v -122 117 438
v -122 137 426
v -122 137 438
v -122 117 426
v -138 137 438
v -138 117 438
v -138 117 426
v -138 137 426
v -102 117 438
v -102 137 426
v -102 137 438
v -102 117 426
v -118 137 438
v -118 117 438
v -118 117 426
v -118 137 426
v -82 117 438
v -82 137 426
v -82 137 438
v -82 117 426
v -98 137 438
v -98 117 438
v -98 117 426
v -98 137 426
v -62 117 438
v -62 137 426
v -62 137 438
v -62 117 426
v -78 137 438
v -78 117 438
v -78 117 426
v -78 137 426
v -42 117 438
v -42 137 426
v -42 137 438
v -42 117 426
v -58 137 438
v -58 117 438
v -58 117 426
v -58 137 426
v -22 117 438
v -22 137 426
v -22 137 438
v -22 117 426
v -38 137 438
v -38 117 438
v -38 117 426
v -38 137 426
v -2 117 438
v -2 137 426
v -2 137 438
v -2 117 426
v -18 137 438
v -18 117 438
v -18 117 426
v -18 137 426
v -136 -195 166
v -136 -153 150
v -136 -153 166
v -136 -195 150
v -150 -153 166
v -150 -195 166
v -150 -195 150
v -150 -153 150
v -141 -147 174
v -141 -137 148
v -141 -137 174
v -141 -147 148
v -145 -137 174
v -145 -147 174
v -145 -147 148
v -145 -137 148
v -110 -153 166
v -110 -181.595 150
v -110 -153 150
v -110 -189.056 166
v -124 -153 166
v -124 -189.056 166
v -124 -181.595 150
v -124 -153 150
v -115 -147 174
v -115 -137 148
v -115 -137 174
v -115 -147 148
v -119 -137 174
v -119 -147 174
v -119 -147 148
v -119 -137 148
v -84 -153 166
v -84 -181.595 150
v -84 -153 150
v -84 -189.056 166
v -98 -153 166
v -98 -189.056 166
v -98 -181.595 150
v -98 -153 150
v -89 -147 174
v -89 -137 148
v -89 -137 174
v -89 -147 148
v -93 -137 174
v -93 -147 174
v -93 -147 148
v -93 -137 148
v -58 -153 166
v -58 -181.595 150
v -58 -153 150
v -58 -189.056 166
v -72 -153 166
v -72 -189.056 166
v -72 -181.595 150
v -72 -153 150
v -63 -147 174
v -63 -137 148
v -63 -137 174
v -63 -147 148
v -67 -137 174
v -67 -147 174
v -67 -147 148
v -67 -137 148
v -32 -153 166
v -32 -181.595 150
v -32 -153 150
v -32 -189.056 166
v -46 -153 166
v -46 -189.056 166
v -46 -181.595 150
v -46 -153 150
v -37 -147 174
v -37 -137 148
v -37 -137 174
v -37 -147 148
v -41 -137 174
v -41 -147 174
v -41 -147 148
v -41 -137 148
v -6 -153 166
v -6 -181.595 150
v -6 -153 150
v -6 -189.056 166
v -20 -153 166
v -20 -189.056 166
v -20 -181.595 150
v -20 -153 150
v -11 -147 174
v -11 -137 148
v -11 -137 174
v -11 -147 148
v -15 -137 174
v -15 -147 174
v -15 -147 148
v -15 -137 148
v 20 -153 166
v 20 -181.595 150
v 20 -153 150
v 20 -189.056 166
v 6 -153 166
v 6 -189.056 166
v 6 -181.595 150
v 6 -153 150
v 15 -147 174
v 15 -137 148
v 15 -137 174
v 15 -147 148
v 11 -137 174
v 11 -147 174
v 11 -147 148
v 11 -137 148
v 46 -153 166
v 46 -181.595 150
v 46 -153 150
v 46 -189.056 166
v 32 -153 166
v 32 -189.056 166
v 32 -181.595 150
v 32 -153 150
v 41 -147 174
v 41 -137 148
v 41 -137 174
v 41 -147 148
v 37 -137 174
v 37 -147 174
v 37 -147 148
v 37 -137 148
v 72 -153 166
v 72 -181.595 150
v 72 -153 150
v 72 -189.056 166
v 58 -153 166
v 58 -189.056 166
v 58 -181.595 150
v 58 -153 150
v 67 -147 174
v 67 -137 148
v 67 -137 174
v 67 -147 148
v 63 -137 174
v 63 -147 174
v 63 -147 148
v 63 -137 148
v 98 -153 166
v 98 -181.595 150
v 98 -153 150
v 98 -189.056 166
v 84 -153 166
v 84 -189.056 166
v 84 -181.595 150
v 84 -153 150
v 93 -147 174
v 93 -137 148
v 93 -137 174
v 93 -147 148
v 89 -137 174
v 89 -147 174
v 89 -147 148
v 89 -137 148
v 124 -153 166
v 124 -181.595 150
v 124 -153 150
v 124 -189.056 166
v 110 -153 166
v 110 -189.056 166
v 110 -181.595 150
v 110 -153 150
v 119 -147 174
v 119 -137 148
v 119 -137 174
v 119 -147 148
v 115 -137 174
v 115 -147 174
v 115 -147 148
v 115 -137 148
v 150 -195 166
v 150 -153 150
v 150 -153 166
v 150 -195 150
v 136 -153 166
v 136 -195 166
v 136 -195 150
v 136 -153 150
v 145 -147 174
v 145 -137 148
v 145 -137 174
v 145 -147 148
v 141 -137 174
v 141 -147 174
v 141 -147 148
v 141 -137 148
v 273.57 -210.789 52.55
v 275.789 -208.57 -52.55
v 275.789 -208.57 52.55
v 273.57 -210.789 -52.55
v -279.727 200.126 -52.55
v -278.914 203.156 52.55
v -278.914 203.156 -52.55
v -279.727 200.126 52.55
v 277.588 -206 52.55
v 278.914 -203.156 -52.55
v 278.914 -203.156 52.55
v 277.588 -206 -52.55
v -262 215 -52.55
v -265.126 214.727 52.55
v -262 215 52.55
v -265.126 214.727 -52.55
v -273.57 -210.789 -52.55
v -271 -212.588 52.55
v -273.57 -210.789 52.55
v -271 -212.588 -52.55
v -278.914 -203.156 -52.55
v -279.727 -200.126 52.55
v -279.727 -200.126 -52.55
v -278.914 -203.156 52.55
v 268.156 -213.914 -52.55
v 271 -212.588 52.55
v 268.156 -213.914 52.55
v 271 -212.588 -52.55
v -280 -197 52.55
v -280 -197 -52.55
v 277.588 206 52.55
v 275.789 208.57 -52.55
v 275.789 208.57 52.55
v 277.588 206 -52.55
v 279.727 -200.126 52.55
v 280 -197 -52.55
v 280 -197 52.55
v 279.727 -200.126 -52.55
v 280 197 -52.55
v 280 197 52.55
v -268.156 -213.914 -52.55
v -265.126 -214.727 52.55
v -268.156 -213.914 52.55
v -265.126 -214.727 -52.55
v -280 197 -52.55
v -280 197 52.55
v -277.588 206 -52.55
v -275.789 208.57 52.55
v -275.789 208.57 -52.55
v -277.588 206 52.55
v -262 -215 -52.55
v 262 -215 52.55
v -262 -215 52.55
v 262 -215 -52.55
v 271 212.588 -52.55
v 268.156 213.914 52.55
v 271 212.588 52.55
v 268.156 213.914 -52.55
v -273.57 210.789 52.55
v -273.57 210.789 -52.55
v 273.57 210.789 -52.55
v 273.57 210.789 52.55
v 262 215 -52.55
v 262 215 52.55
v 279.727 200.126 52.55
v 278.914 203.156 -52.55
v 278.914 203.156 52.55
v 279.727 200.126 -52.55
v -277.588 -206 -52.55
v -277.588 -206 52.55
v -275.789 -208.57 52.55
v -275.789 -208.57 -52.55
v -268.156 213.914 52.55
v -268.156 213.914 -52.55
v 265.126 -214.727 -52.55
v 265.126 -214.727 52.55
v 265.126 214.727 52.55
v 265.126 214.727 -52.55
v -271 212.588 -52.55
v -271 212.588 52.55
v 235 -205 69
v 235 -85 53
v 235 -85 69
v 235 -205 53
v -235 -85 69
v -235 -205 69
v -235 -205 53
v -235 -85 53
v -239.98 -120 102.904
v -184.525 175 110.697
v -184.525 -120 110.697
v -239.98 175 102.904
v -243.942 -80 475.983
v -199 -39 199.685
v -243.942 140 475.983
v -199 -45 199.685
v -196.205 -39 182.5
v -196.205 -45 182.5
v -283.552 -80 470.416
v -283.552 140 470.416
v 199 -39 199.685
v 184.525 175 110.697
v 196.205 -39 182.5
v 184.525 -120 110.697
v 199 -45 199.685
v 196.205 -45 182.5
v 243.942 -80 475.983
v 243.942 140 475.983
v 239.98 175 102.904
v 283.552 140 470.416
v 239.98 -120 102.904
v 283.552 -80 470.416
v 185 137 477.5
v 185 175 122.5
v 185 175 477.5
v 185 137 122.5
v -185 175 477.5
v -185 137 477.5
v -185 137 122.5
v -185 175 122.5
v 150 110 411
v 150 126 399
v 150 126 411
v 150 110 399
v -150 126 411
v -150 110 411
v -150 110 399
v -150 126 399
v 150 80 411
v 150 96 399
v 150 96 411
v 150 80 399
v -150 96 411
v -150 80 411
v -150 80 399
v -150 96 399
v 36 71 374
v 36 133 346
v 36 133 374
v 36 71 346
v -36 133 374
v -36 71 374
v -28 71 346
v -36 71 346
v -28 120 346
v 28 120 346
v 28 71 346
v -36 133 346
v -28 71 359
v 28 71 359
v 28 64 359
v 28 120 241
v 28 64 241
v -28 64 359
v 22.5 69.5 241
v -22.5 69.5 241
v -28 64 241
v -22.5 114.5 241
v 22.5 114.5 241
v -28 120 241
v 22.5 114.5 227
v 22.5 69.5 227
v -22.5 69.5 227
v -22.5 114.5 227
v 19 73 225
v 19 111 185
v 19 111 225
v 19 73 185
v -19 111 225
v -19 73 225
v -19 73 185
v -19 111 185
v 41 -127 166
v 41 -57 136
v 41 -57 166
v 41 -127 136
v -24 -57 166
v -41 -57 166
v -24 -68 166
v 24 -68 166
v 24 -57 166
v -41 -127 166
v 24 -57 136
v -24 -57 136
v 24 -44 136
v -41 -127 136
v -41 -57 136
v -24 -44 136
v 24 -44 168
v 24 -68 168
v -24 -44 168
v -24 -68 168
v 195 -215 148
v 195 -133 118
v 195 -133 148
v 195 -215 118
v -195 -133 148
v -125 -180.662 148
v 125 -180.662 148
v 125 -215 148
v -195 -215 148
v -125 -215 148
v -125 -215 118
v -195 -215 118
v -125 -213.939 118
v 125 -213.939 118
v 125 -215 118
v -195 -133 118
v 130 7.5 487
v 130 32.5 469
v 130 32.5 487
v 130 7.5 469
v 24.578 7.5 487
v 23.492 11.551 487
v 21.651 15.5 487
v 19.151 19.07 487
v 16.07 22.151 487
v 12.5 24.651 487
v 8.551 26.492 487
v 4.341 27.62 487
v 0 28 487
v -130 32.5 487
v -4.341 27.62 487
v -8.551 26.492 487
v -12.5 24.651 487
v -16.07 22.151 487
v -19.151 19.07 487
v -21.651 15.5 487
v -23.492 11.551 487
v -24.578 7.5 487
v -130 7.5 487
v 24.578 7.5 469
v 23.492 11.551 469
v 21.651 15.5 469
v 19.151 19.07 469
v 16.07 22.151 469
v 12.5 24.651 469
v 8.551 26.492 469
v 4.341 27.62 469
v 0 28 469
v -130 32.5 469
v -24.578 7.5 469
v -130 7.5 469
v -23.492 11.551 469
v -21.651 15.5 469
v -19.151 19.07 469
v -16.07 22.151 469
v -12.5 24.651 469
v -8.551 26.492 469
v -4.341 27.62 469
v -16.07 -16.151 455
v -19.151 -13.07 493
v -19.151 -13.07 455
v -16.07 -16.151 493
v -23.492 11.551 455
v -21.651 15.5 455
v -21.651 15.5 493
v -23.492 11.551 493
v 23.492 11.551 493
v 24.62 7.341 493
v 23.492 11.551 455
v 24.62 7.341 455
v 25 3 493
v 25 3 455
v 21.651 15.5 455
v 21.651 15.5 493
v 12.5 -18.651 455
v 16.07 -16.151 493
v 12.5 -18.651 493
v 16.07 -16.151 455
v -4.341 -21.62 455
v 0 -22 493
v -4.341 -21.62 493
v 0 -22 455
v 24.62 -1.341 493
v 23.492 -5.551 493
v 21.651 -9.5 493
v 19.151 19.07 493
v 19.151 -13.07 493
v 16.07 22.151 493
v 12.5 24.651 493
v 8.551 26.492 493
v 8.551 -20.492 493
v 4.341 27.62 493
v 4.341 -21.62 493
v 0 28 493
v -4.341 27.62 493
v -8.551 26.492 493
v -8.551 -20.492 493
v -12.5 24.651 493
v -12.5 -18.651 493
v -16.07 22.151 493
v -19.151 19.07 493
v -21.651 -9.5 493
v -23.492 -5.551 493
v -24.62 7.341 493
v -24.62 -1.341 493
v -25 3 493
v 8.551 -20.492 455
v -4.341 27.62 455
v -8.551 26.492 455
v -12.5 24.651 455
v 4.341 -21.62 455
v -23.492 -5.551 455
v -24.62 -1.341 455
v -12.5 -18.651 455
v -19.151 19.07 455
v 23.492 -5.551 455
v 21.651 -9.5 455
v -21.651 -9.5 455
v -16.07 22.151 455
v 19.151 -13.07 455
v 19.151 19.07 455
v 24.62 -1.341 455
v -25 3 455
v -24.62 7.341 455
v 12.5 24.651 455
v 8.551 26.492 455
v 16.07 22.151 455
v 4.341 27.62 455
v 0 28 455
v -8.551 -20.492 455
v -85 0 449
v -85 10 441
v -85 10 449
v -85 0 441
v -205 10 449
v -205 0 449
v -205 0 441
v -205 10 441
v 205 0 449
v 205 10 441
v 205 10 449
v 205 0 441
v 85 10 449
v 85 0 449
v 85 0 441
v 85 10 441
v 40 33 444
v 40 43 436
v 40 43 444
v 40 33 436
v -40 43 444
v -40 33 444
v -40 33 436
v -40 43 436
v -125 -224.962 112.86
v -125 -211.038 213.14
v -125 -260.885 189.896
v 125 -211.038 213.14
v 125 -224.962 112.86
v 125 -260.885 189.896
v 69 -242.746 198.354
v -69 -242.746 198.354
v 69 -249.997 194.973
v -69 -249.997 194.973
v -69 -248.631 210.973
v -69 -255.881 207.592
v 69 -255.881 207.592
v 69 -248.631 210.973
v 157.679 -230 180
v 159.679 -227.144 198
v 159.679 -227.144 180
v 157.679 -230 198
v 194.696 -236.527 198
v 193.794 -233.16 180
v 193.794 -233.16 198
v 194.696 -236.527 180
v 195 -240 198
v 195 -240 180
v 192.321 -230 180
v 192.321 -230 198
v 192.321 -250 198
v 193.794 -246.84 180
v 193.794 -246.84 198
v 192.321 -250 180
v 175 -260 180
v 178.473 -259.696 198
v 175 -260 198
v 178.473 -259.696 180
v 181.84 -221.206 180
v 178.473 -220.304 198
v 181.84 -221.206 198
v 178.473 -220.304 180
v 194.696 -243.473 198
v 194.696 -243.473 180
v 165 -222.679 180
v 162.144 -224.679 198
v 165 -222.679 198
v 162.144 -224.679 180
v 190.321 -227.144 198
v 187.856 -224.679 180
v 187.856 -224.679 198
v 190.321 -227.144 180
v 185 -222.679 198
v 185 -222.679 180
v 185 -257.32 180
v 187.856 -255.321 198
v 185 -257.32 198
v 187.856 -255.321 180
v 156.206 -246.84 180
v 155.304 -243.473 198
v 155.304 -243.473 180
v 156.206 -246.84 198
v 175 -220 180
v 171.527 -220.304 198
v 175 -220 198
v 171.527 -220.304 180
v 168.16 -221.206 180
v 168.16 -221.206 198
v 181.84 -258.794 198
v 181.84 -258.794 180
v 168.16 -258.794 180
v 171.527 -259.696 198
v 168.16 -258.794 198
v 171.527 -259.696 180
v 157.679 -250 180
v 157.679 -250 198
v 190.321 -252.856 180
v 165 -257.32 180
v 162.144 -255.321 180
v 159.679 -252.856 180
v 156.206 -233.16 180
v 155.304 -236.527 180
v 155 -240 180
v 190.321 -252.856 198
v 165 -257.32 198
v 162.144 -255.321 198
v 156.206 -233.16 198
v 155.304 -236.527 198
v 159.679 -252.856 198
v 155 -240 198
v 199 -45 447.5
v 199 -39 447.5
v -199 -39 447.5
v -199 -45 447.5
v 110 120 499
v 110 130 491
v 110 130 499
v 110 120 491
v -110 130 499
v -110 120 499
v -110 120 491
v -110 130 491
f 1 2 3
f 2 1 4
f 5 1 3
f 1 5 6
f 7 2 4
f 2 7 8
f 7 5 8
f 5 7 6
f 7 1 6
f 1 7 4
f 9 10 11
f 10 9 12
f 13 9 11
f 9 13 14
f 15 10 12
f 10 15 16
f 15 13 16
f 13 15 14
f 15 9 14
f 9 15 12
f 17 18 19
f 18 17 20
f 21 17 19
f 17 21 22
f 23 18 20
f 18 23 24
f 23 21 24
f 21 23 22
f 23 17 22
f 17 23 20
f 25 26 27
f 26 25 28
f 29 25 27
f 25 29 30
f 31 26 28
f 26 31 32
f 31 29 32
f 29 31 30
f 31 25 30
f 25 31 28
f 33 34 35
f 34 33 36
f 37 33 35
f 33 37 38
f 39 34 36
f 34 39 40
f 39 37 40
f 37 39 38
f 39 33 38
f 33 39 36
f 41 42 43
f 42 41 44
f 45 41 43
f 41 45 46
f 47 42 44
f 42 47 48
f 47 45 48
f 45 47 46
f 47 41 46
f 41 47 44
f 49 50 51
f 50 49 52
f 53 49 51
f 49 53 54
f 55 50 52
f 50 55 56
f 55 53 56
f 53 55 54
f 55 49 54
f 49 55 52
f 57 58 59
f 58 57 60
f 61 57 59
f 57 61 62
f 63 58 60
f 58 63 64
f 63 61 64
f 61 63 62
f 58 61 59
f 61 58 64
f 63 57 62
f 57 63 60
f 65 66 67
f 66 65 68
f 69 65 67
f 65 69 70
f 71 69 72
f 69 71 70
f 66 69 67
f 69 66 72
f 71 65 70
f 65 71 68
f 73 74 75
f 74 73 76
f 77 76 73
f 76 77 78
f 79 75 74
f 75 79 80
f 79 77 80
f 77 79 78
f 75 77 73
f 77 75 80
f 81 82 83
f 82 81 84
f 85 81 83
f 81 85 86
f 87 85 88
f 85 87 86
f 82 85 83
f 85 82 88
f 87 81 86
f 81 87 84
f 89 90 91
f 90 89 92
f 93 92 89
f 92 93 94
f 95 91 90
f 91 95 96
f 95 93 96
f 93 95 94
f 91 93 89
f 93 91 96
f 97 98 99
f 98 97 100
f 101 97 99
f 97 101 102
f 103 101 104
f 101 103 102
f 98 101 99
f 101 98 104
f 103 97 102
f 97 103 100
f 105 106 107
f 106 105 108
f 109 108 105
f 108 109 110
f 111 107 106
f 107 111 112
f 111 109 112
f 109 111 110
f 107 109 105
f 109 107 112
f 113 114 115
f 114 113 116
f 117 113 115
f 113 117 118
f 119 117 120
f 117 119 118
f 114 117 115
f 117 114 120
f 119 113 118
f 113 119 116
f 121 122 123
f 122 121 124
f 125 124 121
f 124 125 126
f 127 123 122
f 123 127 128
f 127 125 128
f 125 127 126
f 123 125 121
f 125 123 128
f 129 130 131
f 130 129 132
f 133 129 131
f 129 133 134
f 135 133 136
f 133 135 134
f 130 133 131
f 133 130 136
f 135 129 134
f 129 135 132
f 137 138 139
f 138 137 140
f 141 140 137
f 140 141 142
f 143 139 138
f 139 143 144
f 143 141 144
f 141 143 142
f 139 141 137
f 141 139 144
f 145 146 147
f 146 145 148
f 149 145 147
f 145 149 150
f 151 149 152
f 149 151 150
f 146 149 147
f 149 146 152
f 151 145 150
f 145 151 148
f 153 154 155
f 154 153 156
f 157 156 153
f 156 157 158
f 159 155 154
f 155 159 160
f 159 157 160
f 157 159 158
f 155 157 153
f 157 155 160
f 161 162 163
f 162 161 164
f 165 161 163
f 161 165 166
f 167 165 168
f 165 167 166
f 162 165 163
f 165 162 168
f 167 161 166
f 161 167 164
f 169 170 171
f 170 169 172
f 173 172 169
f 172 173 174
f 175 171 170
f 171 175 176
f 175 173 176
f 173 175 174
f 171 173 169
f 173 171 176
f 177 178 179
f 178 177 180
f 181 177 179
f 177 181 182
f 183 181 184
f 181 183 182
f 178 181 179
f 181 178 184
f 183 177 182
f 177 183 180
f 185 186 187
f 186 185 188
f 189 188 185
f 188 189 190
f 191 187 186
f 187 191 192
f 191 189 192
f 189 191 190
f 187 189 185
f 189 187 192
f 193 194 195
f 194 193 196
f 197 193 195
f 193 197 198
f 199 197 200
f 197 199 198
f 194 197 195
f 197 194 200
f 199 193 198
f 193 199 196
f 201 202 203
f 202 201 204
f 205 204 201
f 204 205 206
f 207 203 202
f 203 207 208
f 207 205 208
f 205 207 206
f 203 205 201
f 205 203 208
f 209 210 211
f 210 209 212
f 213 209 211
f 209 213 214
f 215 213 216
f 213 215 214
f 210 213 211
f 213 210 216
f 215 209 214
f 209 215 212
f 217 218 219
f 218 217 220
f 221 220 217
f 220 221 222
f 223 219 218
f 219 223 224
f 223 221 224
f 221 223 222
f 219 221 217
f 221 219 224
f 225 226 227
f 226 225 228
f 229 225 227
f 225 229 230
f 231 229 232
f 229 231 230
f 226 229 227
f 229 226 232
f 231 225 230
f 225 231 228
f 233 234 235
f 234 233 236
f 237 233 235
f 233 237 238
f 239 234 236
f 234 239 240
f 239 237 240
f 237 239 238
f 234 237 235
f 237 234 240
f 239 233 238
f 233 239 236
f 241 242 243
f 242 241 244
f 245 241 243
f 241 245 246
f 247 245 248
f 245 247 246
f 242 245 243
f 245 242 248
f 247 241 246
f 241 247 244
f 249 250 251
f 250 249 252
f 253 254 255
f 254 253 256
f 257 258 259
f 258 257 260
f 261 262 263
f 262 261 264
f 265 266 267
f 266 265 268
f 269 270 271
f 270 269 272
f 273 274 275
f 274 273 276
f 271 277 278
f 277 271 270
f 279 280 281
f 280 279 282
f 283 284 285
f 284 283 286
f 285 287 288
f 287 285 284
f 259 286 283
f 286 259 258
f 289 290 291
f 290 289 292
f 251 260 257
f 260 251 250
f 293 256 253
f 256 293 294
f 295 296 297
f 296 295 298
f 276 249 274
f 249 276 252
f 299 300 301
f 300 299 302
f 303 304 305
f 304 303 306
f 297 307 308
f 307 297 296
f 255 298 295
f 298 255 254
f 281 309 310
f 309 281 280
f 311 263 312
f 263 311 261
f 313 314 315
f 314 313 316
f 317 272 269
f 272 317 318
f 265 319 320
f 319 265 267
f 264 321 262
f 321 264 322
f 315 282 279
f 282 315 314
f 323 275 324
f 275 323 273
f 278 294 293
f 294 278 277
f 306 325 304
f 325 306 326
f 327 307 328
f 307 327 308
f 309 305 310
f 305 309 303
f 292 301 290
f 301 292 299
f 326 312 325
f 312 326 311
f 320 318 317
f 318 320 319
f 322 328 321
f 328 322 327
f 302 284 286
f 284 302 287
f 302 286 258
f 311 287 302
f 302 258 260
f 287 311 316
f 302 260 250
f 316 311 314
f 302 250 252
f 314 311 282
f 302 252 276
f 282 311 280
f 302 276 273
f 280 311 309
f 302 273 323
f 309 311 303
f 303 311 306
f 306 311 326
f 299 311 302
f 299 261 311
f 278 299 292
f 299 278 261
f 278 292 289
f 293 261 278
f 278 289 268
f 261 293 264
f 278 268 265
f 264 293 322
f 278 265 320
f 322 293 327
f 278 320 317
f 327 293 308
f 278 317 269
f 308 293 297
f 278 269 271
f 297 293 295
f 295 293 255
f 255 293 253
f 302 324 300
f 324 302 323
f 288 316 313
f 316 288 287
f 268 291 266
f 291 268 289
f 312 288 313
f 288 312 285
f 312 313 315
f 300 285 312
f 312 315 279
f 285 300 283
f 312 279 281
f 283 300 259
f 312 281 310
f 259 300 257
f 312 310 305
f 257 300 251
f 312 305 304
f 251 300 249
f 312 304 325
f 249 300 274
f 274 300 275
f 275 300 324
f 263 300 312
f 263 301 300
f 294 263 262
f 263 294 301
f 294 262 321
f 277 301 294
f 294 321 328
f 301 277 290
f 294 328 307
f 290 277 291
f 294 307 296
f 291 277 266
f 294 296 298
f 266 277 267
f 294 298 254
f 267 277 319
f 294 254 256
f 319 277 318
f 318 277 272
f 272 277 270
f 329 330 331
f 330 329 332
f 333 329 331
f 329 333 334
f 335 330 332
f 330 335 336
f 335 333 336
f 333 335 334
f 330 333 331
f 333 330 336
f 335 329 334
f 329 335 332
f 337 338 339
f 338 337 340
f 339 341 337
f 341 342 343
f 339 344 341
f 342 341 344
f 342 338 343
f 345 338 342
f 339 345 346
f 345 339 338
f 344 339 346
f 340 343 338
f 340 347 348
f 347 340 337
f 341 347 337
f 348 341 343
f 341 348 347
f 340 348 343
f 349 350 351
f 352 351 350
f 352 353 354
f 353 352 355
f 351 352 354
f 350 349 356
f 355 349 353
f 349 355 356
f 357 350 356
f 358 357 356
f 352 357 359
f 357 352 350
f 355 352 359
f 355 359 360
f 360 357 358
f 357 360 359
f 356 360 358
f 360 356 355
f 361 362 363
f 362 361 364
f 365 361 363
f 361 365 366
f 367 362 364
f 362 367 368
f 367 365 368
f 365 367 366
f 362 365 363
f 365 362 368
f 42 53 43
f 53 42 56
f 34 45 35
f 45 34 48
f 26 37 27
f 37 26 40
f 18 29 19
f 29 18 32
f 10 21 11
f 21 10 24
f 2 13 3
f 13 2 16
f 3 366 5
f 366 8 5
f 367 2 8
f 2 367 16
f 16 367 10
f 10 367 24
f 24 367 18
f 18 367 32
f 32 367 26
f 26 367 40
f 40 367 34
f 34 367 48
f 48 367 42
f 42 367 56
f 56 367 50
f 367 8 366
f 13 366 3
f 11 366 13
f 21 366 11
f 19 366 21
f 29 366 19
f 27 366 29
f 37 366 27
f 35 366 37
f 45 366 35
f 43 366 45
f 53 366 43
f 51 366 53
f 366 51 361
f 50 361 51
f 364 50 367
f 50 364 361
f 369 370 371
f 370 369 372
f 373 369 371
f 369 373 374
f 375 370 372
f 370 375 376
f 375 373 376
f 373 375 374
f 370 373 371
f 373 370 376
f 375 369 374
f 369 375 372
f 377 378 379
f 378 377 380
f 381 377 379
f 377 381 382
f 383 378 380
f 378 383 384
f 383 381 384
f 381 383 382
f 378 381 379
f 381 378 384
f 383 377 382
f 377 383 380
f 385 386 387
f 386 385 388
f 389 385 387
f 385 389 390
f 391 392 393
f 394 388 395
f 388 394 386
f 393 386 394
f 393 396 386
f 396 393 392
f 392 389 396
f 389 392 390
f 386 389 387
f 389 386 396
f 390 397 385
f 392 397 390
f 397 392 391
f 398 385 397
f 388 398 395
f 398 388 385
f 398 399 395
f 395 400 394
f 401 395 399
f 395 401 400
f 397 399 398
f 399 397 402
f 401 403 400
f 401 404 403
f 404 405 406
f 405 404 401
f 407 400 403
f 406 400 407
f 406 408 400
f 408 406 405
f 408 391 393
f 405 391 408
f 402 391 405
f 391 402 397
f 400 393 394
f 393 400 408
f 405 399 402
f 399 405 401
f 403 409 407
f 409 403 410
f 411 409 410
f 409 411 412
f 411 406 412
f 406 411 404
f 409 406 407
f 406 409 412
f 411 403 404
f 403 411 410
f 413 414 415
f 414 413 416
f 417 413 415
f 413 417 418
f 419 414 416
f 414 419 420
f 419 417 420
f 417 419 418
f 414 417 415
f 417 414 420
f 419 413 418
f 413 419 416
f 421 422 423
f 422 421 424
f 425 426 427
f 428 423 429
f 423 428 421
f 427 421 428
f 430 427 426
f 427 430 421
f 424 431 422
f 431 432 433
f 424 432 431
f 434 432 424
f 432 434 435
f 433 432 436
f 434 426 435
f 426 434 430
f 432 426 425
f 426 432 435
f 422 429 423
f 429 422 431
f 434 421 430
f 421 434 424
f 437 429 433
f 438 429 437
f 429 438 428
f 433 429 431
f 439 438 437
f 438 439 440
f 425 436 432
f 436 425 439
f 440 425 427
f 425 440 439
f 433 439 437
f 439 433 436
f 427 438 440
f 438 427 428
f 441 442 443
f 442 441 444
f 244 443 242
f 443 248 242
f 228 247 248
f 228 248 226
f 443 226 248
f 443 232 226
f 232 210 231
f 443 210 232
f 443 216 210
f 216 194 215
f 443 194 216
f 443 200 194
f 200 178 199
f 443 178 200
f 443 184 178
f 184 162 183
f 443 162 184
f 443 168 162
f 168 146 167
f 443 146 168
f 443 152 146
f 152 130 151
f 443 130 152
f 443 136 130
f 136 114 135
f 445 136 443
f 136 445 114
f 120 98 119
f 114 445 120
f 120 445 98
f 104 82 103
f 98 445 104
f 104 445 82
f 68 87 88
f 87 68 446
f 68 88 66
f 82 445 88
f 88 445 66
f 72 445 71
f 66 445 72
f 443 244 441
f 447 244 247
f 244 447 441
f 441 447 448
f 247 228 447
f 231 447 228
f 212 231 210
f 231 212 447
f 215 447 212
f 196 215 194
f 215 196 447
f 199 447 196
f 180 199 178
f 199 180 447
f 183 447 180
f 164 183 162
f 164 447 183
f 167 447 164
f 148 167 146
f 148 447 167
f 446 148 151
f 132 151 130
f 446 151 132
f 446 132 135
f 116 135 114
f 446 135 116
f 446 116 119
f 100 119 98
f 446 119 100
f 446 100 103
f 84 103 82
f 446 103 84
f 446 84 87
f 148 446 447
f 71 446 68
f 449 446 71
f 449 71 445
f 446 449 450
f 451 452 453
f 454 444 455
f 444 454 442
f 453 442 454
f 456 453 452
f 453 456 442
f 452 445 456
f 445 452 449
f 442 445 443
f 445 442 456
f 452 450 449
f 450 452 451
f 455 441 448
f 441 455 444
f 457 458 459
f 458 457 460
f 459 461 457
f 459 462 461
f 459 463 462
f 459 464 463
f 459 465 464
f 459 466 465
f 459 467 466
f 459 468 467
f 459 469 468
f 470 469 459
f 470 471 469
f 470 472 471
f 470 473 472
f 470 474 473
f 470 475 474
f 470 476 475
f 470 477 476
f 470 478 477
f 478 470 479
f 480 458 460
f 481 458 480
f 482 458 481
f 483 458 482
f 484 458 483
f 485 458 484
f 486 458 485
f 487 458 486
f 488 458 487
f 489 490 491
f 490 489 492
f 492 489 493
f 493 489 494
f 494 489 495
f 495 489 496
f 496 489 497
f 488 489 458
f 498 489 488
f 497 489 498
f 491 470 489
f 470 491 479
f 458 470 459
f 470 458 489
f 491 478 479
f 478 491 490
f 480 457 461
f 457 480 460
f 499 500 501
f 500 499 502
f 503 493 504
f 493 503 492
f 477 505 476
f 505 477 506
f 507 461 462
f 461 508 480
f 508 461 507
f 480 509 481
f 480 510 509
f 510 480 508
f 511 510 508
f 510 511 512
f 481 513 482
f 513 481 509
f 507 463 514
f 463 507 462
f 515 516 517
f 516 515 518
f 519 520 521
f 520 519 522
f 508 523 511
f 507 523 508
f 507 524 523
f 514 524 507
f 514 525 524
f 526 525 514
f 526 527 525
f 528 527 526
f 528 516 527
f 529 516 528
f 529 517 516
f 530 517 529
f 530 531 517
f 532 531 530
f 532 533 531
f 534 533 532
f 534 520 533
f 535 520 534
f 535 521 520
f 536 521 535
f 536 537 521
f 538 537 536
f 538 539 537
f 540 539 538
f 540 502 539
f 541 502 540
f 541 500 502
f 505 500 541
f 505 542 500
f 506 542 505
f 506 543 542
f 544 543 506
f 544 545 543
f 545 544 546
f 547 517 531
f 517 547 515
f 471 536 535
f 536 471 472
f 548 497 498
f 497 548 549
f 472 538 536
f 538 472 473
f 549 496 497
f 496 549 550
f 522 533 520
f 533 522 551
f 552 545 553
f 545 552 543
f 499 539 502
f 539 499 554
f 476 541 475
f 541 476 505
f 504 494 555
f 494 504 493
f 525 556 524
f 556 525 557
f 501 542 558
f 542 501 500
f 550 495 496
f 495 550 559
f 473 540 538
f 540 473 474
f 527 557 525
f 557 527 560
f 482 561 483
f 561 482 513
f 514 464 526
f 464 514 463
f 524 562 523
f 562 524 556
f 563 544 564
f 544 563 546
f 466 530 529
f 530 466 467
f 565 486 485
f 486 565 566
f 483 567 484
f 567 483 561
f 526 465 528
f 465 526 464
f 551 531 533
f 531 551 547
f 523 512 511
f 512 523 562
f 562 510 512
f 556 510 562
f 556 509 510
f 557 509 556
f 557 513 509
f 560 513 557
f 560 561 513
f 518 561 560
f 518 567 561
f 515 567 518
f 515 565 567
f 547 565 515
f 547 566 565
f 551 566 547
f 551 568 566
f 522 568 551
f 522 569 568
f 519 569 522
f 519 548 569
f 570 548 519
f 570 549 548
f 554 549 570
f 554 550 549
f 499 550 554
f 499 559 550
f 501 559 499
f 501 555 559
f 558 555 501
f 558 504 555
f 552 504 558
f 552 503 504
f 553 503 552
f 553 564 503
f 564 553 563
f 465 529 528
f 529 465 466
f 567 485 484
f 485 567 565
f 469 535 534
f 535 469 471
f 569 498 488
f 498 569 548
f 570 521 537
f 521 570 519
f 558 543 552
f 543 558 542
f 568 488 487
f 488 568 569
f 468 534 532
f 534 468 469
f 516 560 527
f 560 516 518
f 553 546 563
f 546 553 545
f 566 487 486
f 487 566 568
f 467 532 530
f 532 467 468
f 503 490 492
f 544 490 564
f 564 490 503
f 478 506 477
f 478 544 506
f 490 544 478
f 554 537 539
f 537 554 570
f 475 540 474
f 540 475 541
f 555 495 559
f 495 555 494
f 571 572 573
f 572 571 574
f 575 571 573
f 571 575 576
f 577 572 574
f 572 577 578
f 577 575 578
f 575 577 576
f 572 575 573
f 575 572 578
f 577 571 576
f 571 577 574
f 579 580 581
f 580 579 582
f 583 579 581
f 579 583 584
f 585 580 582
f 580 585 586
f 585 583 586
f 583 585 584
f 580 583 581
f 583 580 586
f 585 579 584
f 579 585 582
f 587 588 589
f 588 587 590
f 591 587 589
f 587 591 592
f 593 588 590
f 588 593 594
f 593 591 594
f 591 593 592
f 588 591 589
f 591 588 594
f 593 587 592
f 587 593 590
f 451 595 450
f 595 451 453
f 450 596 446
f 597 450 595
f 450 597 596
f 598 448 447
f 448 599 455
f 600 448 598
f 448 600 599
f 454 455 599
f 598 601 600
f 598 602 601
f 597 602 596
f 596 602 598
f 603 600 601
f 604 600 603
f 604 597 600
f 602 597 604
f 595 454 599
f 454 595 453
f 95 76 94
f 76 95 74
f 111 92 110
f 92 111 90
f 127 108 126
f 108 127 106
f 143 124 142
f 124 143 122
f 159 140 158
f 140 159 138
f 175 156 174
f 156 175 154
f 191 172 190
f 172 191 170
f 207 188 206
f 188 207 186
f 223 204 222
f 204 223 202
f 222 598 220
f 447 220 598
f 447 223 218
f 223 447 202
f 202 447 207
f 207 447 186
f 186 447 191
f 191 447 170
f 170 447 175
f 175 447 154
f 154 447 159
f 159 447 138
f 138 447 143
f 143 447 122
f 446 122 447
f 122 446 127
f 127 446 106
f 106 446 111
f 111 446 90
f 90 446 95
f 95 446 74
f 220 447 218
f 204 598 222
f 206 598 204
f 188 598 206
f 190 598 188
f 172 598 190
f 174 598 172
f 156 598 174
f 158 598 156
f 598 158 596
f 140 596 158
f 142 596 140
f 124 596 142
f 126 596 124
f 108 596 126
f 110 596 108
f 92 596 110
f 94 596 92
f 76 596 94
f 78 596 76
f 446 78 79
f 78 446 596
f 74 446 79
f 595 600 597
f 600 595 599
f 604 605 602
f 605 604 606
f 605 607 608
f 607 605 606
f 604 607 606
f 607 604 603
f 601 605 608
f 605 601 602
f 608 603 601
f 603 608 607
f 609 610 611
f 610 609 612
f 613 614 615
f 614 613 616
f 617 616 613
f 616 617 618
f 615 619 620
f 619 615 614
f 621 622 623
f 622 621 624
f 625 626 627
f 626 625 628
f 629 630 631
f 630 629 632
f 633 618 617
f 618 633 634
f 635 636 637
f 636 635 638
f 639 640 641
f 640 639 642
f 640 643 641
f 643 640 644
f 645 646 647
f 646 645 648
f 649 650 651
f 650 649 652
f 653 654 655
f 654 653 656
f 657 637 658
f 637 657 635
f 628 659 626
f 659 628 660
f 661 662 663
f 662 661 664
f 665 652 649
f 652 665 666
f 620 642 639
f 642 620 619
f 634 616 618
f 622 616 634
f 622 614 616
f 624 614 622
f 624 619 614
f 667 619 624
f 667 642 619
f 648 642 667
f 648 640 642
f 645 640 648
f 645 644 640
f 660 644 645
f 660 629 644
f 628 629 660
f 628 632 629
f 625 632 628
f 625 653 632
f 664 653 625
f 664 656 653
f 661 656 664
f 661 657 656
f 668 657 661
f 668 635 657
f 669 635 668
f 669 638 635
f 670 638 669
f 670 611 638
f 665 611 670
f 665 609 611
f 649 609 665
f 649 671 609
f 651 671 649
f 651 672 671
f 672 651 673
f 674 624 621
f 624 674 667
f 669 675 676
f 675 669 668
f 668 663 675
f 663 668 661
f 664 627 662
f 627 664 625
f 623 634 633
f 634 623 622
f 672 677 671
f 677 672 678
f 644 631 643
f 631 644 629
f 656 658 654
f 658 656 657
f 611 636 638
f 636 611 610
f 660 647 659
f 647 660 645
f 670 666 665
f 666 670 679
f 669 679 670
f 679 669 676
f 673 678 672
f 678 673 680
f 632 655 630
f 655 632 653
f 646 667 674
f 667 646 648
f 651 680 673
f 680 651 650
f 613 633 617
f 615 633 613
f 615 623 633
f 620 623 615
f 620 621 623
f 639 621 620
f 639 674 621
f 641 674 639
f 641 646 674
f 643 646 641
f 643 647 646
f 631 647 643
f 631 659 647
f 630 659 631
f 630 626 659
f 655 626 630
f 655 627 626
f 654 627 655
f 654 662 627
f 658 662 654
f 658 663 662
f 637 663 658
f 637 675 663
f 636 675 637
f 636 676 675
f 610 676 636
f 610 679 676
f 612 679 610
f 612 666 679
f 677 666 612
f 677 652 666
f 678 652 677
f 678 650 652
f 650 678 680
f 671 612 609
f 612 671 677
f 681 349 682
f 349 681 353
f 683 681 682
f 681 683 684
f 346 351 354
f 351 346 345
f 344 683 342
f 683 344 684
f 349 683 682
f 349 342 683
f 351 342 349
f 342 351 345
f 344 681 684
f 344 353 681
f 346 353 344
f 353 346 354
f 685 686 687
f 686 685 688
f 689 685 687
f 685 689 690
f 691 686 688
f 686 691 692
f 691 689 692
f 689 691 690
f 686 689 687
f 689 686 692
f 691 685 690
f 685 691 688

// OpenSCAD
// LF-P1-R02. Parametric conceptual CAD. Dimensions mirror parameters.json.
$fn=36; W=560; D=430; H=520; plinth=105; railX=300; trayPitch=26;
module box(x,y,z,c=[.15,.17,.19],a=1){ color(concat(c,[a])) cube([x,y,z],center=true); }
module rounded(x,y,z,r,c){ color(c) minkowski(){cube([x-2*r,y-2*r,z],center=true);cylinder(r=r,h=.1,center=true);} }
module support(side){color([.83,.84,.82]) translate([side*238,35,290]) rotate([0,side*8,0]) polyhedron(points=[[-28,-155,-185],[28,-155,-185],[28,140,-185],[-28,140,-185],[-20,-115,185],[20,-115,185],[20,105,185],[-20,105,185]],faces=[[0,1,2,3],[4,7,6,5],[0,4,5,1],[1,5,6,2],[2,6,7,3],[3,7,4,0]]);}
rounded(W,D,plinth,18,[.12,.14,.16]); translate([0,-145,61]) box(470,120,16,[.78,.79,.77]);
for(x=[-220,220])for(y=[-155,155])translate([x,y,-5])color([.08,.09,.1])cylinder(h=22,r=18);
support(-1);support(1);translate([0,156,300])box(370,38,355,[.12,.14,.16]);
translate([0,118,405])box(railX,16,12,[.22,.25,.27]);translate([0,88,405])box(railX,16,12,[.22,.25,.27]);
translate([0,102,360])box(72,62,28,[.25,.31,.33]);translate([0,92,300])box(56,56,118,[.20,.24,.26]);translate([0,92,235])box(45,45,16,[.55,.55,.56]);translate([0,92,205])box(38,38,40,[.55,.58,.57]);
for(x=[-130:20:0])translate([x,128,432])box(16,22,12,[.08,.09,.1]);
translate([0,-92,151])box(82,70,30,[.15,.45,.52]);translate([0,-56,152])box(48,24,32,[.68,.62,.22]);
translate([0,-174,133])box(390,82,30,[.18,.24,.27]);for(x=[-143:trayPitch:143]){translate([x,-174,158])box(14,42,16,[.28,.32,.34]);translate([x,-142,160])box(4,10,28,[.14,.65,.67]);}
translate([0,20,478])box(260,25,18,[.14,.16,.18]);translate([0,3,455])color([.08,.09,.1])cylinder(h=38,r=25);translate([-145,5,445])box(120,10,8,[.95,.95,.88]);translate([145,5,445])box(120,10,8,[.95,.95,.88]);translate([0,38,440])box(80,10,8,[.90,.94,.94]);
translate([0,-218,163])rotate([25,0,0])box(250,55,85,[.75,.77,.75]);translate([0,-240,183])rotate([25,0,0])box(138,8,58,[.08,.12,.14]);translate([175,-240,180])color([.8,.08,.06])cylinder(h=18,r=20);
color([.45,.75,.78,.22])translate([0,-42,315])box(398,6,265,[.45,.75,.78],.22);translate([0,125,495])box(220,10,8,[.08,.62,.64]);
